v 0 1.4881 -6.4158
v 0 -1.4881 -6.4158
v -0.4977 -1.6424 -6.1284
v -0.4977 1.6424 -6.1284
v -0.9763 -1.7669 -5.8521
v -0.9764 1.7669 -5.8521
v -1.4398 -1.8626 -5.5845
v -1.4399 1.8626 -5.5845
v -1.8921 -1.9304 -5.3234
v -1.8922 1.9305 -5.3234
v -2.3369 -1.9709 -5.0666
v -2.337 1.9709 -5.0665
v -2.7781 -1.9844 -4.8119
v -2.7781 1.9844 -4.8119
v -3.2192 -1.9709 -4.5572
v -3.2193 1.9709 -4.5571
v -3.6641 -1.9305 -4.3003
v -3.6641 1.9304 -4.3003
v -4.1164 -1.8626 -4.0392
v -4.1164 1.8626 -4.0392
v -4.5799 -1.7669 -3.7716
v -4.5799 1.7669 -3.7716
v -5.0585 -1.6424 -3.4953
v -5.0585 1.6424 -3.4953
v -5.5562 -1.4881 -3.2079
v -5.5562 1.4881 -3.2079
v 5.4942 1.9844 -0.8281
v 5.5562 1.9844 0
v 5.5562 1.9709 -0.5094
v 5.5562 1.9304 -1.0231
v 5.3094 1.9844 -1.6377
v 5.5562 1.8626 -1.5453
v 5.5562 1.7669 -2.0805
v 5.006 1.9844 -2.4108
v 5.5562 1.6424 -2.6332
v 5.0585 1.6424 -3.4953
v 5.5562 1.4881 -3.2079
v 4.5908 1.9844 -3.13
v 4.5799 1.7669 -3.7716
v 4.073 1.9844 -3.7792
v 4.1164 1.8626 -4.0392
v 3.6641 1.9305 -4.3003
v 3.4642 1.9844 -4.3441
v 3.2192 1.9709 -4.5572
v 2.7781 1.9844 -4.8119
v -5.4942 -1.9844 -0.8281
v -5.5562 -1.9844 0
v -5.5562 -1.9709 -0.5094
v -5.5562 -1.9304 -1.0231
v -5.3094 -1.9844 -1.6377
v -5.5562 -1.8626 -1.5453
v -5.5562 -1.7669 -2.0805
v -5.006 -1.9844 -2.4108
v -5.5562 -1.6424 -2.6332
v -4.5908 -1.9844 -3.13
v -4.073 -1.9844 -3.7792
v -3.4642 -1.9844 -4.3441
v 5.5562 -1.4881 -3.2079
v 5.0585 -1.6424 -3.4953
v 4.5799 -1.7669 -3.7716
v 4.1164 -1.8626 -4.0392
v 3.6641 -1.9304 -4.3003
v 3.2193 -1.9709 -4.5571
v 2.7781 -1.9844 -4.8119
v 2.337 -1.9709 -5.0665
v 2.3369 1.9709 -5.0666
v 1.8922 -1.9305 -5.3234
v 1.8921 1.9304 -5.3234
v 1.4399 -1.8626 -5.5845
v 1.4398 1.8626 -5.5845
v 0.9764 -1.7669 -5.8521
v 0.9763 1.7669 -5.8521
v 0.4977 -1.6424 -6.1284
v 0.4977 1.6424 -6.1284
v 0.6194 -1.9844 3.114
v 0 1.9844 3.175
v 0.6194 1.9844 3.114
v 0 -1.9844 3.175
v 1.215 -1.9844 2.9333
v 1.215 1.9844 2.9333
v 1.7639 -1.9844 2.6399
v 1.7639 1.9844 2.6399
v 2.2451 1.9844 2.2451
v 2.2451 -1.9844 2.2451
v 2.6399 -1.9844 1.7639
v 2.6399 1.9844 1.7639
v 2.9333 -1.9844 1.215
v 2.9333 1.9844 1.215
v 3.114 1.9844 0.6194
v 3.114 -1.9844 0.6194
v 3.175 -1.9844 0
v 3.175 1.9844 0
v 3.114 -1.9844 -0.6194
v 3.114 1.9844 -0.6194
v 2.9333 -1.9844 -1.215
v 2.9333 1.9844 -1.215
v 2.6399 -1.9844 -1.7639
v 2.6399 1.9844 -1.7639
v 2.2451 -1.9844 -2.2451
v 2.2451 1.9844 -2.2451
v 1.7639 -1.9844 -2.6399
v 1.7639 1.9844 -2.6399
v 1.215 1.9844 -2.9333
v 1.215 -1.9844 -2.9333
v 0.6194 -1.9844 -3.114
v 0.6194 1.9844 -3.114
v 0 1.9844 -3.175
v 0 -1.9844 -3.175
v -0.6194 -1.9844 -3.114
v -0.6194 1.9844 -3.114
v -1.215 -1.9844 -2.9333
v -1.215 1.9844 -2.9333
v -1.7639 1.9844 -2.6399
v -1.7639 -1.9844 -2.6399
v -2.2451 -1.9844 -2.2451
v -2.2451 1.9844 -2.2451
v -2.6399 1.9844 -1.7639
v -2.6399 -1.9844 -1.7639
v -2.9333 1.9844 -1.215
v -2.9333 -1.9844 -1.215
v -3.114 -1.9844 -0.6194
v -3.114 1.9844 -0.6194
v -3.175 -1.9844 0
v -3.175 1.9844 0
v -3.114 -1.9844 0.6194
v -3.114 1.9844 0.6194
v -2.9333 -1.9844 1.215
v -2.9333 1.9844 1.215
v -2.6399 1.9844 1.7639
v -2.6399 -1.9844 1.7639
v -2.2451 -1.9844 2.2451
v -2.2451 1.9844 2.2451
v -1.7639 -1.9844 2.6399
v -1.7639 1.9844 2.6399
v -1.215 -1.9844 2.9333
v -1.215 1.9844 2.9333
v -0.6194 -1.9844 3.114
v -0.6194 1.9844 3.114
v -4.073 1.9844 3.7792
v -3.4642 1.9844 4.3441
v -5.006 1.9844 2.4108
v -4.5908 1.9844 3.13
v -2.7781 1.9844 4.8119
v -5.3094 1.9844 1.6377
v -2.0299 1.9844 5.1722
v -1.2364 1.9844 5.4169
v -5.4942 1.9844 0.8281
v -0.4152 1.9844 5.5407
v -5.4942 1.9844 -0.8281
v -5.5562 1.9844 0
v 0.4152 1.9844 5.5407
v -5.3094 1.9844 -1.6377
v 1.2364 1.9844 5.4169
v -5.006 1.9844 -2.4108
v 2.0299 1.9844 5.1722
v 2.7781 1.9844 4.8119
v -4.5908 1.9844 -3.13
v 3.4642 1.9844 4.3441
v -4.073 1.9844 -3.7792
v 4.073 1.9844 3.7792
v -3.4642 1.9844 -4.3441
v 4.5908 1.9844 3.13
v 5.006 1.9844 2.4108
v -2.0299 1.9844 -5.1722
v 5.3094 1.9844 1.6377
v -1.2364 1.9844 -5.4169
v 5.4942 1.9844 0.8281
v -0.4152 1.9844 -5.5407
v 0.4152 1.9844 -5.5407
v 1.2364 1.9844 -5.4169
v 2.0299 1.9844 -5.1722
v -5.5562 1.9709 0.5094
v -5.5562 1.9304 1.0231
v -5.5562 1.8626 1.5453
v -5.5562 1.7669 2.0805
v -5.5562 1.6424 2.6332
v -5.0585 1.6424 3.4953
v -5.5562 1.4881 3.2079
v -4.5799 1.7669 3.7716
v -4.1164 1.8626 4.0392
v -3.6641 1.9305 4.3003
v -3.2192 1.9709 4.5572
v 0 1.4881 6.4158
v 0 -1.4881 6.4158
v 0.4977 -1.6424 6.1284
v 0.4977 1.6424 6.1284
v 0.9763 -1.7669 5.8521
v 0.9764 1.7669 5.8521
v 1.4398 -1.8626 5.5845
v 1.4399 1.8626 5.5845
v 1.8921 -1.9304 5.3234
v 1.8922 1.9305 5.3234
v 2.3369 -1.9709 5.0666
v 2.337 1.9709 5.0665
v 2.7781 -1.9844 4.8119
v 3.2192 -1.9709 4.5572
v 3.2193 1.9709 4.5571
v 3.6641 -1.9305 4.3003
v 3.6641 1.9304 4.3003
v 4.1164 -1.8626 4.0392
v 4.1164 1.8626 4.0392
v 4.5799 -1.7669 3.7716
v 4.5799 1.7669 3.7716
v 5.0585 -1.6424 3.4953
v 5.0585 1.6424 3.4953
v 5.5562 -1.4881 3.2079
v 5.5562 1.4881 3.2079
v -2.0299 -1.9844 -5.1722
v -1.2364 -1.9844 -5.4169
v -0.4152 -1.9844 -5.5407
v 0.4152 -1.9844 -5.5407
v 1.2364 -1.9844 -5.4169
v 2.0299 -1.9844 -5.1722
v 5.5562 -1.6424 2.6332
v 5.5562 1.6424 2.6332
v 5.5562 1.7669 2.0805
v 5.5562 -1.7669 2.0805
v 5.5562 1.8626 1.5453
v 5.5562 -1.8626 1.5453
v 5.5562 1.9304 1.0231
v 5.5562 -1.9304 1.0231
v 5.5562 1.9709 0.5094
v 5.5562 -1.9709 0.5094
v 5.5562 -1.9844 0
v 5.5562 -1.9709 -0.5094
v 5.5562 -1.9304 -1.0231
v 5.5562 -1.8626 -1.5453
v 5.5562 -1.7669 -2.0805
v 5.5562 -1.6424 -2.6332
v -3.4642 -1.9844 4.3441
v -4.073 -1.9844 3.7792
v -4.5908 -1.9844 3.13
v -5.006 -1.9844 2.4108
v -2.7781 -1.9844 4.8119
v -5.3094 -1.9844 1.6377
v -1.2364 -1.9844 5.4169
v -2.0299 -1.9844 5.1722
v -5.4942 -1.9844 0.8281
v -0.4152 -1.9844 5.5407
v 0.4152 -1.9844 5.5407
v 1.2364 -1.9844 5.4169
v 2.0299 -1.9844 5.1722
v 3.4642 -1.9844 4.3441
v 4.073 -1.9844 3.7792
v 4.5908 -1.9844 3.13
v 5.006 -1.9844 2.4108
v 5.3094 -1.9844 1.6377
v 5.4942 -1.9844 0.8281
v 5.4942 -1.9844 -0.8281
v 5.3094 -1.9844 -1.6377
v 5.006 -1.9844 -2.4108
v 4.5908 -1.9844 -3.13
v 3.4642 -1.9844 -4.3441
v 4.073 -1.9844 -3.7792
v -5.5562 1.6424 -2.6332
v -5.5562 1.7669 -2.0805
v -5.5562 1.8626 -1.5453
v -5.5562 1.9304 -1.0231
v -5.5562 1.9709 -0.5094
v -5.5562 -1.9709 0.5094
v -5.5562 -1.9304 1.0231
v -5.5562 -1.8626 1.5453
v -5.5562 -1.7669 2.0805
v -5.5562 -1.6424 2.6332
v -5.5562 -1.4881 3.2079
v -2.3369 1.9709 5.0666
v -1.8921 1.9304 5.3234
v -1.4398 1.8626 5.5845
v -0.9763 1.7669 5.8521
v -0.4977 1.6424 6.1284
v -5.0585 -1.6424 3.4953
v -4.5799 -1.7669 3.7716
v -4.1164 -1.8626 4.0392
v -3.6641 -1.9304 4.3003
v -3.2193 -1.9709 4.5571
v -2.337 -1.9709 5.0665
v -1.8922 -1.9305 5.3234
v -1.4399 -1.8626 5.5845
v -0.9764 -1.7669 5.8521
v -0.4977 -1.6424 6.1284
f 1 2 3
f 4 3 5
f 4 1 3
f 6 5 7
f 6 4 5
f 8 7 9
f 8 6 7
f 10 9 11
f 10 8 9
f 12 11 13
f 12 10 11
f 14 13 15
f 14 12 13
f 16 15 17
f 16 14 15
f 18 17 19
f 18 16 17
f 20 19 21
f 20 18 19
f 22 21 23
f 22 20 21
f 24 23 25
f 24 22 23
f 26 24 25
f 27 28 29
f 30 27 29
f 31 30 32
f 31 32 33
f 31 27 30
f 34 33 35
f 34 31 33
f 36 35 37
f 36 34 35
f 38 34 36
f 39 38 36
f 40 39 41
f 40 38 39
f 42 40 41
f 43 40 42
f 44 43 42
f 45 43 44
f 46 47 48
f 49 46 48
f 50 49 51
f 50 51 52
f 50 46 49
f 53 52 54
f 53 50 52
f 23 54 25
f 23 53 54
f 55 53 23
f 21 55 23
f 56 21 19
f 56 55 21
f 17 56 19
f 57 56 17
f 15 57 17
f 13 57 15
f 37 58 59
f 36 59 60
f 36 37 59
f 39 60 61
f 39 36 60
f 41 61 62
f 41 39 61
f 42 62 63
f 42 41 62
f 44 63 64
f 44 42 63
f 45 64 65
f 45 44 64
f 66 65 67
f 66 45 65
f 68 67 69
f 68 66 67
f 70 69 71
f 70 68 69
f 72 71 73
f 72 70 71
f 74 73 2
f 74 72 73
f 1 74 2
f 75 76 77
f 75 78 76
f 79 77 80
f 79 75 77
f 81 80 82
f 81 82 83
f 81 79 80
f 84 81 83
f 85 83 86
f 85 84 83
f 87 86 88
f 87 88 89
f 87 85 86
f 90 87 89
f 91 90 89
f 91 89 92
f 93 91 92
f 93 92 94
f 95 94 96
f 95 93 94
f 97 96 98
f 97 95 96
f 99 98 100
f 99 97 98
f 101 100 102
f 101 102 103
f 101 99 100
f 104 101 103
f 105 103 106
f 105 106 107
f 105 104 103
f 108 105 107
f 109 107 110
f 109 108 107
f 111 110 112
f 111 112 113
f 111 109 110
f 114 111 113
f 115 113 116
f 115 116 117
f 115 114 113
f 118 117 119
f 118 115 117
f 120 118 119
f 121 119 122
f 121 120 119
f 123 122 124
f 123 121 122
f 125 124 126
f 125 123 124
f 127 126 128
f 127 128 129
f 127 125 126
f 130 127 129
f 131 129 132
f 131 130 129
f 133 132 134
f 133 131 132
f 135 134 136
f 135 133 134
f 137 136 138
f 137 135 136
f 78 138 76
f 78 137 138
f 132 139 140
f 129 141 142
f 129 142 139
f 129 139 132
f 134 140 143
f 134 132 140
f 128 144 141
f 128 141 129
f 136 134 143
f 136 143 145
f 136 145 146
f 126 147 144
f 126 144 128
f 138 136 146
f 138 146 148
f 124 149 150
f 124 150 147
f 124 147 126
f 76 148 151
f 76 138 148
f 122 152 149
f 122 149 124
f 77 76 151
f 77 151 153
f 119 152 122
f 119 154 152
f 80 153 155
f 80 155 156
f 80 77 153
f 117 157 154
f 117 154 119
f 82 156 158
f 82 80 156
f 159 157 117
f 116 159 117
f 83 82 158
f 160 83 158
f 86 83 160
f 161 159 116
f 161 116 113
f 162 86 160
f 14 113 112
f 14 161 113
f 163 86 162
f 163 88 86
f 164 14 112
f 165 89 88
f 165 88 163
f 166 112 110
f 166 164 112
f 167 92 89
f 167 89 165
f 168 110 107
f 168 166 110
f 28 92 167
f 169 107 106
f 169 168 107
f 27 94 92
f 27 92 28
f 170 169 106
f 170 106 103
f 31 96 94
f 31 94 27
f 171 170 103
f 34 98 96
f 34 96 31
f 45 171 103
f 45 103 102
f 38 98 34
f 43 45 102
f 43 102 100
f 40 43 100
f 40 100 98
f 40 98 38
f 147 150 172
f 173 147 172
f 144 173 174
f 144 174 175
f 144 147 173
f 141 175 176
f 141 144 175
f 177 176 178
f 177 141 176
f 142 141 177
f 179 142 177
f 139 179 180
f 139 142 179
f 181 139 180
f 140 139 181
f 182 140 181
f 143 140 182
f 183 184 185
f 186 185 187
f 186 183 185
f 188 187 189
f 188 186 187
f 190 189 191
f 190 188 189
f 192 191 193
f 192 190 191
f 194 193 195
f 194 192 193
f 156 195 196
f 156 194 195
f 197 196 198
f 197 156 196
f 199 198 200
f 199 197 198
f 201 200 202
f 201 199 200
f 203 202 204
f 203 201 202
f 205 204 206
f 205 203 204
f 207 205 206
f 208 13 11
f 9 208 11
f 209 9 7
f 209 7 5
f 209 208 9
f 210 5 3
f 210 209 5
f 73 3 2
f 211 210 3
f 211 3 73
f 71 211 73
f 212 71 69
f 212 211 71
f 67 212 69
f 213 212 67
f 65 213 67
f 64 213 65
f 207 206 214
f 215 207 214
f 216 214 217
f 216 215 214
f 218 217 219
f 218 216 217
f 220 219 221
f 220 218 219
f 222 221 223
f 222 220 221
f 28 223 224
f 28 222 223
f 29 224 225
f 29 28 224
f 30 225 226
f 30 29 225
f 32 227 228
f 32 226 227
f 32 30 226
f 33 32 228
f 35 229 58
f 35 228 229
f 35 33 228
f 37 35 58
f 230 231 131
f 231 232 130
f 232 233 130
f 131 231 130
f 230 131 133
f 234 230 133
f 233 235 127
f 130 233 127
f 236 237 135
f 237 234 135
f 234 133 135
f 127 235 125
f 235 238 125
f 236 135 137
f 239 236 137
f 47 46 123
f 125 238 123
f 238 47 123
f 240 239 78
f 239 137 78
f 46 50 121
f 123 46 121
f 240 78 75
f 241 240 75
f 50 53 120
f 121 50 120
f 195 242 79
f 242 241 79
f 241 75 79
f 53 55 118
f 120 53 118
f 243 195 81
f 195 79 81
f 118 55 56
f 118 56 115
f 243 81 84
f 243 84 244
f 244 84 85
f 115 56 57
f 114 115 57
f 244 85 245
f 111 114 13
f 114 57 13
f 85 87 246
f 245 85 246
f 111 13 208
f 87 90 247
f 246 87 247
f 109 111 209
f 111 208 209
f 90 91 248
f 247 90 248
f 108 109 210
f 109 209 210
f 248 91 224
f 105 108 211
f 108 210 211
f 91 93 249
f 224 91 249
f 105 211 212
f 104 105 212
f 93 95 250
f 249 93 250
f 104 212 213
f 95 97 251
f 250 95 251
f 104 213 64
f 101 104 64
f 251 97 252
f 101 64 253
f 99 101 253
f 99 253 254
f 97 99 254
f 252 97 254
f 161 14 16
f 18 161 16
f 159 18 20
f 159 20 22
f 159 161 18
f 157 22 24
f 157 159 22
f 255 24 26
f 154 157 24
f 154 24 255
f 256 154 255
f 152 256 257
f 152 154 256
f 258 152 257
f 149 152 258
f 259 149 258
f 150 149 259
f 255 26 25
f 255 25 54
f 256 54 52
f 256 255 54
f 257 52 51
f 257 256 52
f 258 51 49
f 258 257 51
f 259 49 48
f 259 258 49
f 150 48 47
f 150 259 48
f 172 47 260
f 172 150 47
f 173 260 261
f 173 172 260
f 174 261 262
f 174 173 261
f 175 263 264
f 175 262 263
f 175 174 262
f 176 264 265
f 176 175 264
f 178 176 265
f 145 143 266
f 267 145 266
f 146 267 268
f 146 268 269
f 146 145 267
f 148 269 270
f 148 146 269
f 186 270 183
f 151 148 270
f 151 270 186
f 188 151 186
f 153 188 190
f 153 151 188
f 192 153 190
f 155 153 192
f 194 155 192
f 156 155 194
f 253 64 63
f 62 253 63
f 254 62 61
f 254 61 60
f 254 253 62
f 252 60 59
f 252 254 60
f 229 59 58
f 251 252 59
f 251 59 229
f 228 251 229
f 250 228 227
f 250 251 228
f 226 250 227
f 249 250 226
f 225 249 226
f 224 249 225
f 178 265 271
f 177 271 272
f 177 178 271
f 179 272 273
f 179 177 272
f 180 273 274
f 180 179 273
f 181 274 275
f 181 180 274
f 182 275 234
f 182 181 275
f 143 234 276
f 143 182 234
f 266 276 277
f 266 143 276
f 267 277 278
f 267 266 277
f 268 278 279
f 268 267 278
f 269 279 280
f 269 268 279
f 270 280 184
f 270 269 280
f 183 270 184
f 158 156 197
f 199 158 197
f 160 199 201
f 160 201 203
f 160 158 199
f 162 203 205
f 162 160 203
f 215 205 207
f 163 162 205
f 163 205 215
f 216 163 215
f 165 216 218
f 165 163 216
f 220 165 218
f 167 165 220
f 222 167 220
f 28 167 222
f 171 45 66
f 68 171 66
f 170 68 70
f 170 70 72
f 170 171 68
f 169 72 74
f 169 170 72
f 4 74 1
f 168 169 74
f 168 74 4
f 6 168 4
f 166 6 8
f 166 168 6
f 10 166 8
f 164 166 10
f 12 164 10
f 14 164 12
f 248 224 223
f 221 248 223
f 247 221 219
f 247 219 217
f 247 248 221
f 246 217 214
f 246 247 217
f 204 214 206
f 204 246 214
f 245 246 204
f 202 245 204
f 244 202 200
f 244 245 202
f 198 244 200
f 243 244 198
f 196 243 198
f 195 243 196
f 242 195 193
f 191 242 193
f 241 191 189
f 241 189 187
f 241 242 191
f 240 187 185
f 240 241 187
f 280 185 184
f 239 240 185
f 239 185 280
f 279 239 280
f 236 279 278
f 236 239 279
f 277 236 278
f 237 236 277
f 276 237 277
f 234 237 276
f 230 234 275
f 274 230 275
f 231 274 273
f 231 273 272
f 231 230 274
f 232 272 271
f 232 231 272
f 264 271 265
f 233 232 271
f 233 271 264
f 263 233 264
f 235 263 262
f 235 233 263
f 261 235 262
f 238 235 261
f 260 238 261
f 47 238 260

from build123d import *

# Parameters (mm, degrees)
SKETCH1_R               = 3.175
BOSS_EXTRUDE1_DEPTH     = 1.984375
SKETCH5_OUTSIDE_W       = 52.52
SKETCH5_OUTSIDE_H       = 54.24
SKETCH5_OUTSIDE_R       = 5.55625
CUT_EXTRUDE2_DEPTH      = 10.369388598
CUT_EXTRUDE2_DRAFT      = -60
MIRROR1_COPY_1_SKETCH_W = 52.52
MIRROR1_COPY_1_SKETCH_H = 54.24
MIRROR1_COPY_1_SKETCH_R = 5.55625
MIRROR1_COPY_1_DEPTH    = 10.369388598
MIRROR1_COPY_1_DRAFT    = -60


with BuildPart() as part:
    # Sketch1 → Boss-Extrude1 (new, symmetric)
    with BuildSketch(Plane(origin=(0, 0, 0), x_dir=(1, 0, 0), z_dir=(0, 1, 0))):
        Polygon((-5.55625, 3.207902433), (-5.55625, -3.207902433), (0, -6.415804866), (5.55625, -3.207902433), (5.55625, 3.207902433), (0, 6.415804866), align=None)
        Circle(SKETCH1_R, mode=Mode.SUBTRACT)
    extrude(amount=BOSS_EXTRUDE1_DEPTH, both=True)


with BuildPart() as cut_extrude2_tool:
    # Sketch5 outside → Cut-Extrude2 (with draft: the straight prism first)
    with BuildSketch(Plane(origin=(0, 1.984375, 0), x_dir=(1, 0, 0), z_dir=(0, 1, 0))):
        Rectangle(SKETCH5_OUTSIDE_W, SKETCH5_OUTSIDE_H)
        Circle(SKETCH5_OUTSIDE_R, mode=Mode.SUBTRACT)
    extrude(amount=-CUT_EXTRUDE2_DEPTH)
    # Cut-Extrude2: the draft: its side faces are tilted about the plane it starts from
    cut_extrude2_sides = [cut_extrude2_tool.faces().sort_by_distance(p)[0] for p in [
        (0, -3.200319299, 27.12),
        (26.26, -3.200319299, 0),
        (0, -3.200319299, -27.12),
        (-26.26, -3.200319299, 0),
        (-5.55625, -3.200319299, 0),
    ]]
    draft(cut_extrude2_sides, Plane(origin=(0, 1.984375, 0), x_dir=(1, 0, 0), z_dir=(0, 1, 0)), CUT_EXTRUDE2_DRAFT)


with BuildPart() as part_1:
    add(part.part)

    # Cut-Extrude2: cut by cut_extrude2_tool
    add(cut_extrude2_tool.part, mode=Mode.SUBTRACT)


with BuildPart() as mirror1_copy_1_tool:
    # Mirror1 copy 1 sketch → Mirror1 copy 1 (with draft: the straight prism first)
    with BuildSketch(Plane.XZ.offset(1.984375)):
        Rectangle(MIRROR1_COPY_1_SKETCH_W, MIRROR1_COPY_1_SKETCH_H)
        Circle(MIRROR1_COPY_1_SKETCH_R, mode=Mode.SUBTRACT)
    extrude(amount=-MIRROR1_COPY_1_DEPTH)
    # Mirror1 copy 1: the draft: its side faces are tilted about the plane it starts from
    mirror1_copy_1_sides = [mirror1_copy_1_tool.faces().sort_by_distance(p)[0] for p in [
        (0, 3.200319299, 27.12),
        (26.26, 3.200319299, 0),
        (0, 3.200319299, -27.12),
        (-26.26, 3.200319299, 0),
        (-5.55625, 3.200319299, 0),
    ]]
    draft(mirror1_copy_1_sides, Plane.XZ.offset(1.984375), MIRROR1_COPY_1_DRAFT)


with BuildPart() as part_2:
    add(part_1.part)

    # Mirror1 copy 1: cut by mirror1_copy_1_tool
    add(mirror1_copy_1_tool.part, mode=Mode.SUBTRACT)


solid = part_2.part
